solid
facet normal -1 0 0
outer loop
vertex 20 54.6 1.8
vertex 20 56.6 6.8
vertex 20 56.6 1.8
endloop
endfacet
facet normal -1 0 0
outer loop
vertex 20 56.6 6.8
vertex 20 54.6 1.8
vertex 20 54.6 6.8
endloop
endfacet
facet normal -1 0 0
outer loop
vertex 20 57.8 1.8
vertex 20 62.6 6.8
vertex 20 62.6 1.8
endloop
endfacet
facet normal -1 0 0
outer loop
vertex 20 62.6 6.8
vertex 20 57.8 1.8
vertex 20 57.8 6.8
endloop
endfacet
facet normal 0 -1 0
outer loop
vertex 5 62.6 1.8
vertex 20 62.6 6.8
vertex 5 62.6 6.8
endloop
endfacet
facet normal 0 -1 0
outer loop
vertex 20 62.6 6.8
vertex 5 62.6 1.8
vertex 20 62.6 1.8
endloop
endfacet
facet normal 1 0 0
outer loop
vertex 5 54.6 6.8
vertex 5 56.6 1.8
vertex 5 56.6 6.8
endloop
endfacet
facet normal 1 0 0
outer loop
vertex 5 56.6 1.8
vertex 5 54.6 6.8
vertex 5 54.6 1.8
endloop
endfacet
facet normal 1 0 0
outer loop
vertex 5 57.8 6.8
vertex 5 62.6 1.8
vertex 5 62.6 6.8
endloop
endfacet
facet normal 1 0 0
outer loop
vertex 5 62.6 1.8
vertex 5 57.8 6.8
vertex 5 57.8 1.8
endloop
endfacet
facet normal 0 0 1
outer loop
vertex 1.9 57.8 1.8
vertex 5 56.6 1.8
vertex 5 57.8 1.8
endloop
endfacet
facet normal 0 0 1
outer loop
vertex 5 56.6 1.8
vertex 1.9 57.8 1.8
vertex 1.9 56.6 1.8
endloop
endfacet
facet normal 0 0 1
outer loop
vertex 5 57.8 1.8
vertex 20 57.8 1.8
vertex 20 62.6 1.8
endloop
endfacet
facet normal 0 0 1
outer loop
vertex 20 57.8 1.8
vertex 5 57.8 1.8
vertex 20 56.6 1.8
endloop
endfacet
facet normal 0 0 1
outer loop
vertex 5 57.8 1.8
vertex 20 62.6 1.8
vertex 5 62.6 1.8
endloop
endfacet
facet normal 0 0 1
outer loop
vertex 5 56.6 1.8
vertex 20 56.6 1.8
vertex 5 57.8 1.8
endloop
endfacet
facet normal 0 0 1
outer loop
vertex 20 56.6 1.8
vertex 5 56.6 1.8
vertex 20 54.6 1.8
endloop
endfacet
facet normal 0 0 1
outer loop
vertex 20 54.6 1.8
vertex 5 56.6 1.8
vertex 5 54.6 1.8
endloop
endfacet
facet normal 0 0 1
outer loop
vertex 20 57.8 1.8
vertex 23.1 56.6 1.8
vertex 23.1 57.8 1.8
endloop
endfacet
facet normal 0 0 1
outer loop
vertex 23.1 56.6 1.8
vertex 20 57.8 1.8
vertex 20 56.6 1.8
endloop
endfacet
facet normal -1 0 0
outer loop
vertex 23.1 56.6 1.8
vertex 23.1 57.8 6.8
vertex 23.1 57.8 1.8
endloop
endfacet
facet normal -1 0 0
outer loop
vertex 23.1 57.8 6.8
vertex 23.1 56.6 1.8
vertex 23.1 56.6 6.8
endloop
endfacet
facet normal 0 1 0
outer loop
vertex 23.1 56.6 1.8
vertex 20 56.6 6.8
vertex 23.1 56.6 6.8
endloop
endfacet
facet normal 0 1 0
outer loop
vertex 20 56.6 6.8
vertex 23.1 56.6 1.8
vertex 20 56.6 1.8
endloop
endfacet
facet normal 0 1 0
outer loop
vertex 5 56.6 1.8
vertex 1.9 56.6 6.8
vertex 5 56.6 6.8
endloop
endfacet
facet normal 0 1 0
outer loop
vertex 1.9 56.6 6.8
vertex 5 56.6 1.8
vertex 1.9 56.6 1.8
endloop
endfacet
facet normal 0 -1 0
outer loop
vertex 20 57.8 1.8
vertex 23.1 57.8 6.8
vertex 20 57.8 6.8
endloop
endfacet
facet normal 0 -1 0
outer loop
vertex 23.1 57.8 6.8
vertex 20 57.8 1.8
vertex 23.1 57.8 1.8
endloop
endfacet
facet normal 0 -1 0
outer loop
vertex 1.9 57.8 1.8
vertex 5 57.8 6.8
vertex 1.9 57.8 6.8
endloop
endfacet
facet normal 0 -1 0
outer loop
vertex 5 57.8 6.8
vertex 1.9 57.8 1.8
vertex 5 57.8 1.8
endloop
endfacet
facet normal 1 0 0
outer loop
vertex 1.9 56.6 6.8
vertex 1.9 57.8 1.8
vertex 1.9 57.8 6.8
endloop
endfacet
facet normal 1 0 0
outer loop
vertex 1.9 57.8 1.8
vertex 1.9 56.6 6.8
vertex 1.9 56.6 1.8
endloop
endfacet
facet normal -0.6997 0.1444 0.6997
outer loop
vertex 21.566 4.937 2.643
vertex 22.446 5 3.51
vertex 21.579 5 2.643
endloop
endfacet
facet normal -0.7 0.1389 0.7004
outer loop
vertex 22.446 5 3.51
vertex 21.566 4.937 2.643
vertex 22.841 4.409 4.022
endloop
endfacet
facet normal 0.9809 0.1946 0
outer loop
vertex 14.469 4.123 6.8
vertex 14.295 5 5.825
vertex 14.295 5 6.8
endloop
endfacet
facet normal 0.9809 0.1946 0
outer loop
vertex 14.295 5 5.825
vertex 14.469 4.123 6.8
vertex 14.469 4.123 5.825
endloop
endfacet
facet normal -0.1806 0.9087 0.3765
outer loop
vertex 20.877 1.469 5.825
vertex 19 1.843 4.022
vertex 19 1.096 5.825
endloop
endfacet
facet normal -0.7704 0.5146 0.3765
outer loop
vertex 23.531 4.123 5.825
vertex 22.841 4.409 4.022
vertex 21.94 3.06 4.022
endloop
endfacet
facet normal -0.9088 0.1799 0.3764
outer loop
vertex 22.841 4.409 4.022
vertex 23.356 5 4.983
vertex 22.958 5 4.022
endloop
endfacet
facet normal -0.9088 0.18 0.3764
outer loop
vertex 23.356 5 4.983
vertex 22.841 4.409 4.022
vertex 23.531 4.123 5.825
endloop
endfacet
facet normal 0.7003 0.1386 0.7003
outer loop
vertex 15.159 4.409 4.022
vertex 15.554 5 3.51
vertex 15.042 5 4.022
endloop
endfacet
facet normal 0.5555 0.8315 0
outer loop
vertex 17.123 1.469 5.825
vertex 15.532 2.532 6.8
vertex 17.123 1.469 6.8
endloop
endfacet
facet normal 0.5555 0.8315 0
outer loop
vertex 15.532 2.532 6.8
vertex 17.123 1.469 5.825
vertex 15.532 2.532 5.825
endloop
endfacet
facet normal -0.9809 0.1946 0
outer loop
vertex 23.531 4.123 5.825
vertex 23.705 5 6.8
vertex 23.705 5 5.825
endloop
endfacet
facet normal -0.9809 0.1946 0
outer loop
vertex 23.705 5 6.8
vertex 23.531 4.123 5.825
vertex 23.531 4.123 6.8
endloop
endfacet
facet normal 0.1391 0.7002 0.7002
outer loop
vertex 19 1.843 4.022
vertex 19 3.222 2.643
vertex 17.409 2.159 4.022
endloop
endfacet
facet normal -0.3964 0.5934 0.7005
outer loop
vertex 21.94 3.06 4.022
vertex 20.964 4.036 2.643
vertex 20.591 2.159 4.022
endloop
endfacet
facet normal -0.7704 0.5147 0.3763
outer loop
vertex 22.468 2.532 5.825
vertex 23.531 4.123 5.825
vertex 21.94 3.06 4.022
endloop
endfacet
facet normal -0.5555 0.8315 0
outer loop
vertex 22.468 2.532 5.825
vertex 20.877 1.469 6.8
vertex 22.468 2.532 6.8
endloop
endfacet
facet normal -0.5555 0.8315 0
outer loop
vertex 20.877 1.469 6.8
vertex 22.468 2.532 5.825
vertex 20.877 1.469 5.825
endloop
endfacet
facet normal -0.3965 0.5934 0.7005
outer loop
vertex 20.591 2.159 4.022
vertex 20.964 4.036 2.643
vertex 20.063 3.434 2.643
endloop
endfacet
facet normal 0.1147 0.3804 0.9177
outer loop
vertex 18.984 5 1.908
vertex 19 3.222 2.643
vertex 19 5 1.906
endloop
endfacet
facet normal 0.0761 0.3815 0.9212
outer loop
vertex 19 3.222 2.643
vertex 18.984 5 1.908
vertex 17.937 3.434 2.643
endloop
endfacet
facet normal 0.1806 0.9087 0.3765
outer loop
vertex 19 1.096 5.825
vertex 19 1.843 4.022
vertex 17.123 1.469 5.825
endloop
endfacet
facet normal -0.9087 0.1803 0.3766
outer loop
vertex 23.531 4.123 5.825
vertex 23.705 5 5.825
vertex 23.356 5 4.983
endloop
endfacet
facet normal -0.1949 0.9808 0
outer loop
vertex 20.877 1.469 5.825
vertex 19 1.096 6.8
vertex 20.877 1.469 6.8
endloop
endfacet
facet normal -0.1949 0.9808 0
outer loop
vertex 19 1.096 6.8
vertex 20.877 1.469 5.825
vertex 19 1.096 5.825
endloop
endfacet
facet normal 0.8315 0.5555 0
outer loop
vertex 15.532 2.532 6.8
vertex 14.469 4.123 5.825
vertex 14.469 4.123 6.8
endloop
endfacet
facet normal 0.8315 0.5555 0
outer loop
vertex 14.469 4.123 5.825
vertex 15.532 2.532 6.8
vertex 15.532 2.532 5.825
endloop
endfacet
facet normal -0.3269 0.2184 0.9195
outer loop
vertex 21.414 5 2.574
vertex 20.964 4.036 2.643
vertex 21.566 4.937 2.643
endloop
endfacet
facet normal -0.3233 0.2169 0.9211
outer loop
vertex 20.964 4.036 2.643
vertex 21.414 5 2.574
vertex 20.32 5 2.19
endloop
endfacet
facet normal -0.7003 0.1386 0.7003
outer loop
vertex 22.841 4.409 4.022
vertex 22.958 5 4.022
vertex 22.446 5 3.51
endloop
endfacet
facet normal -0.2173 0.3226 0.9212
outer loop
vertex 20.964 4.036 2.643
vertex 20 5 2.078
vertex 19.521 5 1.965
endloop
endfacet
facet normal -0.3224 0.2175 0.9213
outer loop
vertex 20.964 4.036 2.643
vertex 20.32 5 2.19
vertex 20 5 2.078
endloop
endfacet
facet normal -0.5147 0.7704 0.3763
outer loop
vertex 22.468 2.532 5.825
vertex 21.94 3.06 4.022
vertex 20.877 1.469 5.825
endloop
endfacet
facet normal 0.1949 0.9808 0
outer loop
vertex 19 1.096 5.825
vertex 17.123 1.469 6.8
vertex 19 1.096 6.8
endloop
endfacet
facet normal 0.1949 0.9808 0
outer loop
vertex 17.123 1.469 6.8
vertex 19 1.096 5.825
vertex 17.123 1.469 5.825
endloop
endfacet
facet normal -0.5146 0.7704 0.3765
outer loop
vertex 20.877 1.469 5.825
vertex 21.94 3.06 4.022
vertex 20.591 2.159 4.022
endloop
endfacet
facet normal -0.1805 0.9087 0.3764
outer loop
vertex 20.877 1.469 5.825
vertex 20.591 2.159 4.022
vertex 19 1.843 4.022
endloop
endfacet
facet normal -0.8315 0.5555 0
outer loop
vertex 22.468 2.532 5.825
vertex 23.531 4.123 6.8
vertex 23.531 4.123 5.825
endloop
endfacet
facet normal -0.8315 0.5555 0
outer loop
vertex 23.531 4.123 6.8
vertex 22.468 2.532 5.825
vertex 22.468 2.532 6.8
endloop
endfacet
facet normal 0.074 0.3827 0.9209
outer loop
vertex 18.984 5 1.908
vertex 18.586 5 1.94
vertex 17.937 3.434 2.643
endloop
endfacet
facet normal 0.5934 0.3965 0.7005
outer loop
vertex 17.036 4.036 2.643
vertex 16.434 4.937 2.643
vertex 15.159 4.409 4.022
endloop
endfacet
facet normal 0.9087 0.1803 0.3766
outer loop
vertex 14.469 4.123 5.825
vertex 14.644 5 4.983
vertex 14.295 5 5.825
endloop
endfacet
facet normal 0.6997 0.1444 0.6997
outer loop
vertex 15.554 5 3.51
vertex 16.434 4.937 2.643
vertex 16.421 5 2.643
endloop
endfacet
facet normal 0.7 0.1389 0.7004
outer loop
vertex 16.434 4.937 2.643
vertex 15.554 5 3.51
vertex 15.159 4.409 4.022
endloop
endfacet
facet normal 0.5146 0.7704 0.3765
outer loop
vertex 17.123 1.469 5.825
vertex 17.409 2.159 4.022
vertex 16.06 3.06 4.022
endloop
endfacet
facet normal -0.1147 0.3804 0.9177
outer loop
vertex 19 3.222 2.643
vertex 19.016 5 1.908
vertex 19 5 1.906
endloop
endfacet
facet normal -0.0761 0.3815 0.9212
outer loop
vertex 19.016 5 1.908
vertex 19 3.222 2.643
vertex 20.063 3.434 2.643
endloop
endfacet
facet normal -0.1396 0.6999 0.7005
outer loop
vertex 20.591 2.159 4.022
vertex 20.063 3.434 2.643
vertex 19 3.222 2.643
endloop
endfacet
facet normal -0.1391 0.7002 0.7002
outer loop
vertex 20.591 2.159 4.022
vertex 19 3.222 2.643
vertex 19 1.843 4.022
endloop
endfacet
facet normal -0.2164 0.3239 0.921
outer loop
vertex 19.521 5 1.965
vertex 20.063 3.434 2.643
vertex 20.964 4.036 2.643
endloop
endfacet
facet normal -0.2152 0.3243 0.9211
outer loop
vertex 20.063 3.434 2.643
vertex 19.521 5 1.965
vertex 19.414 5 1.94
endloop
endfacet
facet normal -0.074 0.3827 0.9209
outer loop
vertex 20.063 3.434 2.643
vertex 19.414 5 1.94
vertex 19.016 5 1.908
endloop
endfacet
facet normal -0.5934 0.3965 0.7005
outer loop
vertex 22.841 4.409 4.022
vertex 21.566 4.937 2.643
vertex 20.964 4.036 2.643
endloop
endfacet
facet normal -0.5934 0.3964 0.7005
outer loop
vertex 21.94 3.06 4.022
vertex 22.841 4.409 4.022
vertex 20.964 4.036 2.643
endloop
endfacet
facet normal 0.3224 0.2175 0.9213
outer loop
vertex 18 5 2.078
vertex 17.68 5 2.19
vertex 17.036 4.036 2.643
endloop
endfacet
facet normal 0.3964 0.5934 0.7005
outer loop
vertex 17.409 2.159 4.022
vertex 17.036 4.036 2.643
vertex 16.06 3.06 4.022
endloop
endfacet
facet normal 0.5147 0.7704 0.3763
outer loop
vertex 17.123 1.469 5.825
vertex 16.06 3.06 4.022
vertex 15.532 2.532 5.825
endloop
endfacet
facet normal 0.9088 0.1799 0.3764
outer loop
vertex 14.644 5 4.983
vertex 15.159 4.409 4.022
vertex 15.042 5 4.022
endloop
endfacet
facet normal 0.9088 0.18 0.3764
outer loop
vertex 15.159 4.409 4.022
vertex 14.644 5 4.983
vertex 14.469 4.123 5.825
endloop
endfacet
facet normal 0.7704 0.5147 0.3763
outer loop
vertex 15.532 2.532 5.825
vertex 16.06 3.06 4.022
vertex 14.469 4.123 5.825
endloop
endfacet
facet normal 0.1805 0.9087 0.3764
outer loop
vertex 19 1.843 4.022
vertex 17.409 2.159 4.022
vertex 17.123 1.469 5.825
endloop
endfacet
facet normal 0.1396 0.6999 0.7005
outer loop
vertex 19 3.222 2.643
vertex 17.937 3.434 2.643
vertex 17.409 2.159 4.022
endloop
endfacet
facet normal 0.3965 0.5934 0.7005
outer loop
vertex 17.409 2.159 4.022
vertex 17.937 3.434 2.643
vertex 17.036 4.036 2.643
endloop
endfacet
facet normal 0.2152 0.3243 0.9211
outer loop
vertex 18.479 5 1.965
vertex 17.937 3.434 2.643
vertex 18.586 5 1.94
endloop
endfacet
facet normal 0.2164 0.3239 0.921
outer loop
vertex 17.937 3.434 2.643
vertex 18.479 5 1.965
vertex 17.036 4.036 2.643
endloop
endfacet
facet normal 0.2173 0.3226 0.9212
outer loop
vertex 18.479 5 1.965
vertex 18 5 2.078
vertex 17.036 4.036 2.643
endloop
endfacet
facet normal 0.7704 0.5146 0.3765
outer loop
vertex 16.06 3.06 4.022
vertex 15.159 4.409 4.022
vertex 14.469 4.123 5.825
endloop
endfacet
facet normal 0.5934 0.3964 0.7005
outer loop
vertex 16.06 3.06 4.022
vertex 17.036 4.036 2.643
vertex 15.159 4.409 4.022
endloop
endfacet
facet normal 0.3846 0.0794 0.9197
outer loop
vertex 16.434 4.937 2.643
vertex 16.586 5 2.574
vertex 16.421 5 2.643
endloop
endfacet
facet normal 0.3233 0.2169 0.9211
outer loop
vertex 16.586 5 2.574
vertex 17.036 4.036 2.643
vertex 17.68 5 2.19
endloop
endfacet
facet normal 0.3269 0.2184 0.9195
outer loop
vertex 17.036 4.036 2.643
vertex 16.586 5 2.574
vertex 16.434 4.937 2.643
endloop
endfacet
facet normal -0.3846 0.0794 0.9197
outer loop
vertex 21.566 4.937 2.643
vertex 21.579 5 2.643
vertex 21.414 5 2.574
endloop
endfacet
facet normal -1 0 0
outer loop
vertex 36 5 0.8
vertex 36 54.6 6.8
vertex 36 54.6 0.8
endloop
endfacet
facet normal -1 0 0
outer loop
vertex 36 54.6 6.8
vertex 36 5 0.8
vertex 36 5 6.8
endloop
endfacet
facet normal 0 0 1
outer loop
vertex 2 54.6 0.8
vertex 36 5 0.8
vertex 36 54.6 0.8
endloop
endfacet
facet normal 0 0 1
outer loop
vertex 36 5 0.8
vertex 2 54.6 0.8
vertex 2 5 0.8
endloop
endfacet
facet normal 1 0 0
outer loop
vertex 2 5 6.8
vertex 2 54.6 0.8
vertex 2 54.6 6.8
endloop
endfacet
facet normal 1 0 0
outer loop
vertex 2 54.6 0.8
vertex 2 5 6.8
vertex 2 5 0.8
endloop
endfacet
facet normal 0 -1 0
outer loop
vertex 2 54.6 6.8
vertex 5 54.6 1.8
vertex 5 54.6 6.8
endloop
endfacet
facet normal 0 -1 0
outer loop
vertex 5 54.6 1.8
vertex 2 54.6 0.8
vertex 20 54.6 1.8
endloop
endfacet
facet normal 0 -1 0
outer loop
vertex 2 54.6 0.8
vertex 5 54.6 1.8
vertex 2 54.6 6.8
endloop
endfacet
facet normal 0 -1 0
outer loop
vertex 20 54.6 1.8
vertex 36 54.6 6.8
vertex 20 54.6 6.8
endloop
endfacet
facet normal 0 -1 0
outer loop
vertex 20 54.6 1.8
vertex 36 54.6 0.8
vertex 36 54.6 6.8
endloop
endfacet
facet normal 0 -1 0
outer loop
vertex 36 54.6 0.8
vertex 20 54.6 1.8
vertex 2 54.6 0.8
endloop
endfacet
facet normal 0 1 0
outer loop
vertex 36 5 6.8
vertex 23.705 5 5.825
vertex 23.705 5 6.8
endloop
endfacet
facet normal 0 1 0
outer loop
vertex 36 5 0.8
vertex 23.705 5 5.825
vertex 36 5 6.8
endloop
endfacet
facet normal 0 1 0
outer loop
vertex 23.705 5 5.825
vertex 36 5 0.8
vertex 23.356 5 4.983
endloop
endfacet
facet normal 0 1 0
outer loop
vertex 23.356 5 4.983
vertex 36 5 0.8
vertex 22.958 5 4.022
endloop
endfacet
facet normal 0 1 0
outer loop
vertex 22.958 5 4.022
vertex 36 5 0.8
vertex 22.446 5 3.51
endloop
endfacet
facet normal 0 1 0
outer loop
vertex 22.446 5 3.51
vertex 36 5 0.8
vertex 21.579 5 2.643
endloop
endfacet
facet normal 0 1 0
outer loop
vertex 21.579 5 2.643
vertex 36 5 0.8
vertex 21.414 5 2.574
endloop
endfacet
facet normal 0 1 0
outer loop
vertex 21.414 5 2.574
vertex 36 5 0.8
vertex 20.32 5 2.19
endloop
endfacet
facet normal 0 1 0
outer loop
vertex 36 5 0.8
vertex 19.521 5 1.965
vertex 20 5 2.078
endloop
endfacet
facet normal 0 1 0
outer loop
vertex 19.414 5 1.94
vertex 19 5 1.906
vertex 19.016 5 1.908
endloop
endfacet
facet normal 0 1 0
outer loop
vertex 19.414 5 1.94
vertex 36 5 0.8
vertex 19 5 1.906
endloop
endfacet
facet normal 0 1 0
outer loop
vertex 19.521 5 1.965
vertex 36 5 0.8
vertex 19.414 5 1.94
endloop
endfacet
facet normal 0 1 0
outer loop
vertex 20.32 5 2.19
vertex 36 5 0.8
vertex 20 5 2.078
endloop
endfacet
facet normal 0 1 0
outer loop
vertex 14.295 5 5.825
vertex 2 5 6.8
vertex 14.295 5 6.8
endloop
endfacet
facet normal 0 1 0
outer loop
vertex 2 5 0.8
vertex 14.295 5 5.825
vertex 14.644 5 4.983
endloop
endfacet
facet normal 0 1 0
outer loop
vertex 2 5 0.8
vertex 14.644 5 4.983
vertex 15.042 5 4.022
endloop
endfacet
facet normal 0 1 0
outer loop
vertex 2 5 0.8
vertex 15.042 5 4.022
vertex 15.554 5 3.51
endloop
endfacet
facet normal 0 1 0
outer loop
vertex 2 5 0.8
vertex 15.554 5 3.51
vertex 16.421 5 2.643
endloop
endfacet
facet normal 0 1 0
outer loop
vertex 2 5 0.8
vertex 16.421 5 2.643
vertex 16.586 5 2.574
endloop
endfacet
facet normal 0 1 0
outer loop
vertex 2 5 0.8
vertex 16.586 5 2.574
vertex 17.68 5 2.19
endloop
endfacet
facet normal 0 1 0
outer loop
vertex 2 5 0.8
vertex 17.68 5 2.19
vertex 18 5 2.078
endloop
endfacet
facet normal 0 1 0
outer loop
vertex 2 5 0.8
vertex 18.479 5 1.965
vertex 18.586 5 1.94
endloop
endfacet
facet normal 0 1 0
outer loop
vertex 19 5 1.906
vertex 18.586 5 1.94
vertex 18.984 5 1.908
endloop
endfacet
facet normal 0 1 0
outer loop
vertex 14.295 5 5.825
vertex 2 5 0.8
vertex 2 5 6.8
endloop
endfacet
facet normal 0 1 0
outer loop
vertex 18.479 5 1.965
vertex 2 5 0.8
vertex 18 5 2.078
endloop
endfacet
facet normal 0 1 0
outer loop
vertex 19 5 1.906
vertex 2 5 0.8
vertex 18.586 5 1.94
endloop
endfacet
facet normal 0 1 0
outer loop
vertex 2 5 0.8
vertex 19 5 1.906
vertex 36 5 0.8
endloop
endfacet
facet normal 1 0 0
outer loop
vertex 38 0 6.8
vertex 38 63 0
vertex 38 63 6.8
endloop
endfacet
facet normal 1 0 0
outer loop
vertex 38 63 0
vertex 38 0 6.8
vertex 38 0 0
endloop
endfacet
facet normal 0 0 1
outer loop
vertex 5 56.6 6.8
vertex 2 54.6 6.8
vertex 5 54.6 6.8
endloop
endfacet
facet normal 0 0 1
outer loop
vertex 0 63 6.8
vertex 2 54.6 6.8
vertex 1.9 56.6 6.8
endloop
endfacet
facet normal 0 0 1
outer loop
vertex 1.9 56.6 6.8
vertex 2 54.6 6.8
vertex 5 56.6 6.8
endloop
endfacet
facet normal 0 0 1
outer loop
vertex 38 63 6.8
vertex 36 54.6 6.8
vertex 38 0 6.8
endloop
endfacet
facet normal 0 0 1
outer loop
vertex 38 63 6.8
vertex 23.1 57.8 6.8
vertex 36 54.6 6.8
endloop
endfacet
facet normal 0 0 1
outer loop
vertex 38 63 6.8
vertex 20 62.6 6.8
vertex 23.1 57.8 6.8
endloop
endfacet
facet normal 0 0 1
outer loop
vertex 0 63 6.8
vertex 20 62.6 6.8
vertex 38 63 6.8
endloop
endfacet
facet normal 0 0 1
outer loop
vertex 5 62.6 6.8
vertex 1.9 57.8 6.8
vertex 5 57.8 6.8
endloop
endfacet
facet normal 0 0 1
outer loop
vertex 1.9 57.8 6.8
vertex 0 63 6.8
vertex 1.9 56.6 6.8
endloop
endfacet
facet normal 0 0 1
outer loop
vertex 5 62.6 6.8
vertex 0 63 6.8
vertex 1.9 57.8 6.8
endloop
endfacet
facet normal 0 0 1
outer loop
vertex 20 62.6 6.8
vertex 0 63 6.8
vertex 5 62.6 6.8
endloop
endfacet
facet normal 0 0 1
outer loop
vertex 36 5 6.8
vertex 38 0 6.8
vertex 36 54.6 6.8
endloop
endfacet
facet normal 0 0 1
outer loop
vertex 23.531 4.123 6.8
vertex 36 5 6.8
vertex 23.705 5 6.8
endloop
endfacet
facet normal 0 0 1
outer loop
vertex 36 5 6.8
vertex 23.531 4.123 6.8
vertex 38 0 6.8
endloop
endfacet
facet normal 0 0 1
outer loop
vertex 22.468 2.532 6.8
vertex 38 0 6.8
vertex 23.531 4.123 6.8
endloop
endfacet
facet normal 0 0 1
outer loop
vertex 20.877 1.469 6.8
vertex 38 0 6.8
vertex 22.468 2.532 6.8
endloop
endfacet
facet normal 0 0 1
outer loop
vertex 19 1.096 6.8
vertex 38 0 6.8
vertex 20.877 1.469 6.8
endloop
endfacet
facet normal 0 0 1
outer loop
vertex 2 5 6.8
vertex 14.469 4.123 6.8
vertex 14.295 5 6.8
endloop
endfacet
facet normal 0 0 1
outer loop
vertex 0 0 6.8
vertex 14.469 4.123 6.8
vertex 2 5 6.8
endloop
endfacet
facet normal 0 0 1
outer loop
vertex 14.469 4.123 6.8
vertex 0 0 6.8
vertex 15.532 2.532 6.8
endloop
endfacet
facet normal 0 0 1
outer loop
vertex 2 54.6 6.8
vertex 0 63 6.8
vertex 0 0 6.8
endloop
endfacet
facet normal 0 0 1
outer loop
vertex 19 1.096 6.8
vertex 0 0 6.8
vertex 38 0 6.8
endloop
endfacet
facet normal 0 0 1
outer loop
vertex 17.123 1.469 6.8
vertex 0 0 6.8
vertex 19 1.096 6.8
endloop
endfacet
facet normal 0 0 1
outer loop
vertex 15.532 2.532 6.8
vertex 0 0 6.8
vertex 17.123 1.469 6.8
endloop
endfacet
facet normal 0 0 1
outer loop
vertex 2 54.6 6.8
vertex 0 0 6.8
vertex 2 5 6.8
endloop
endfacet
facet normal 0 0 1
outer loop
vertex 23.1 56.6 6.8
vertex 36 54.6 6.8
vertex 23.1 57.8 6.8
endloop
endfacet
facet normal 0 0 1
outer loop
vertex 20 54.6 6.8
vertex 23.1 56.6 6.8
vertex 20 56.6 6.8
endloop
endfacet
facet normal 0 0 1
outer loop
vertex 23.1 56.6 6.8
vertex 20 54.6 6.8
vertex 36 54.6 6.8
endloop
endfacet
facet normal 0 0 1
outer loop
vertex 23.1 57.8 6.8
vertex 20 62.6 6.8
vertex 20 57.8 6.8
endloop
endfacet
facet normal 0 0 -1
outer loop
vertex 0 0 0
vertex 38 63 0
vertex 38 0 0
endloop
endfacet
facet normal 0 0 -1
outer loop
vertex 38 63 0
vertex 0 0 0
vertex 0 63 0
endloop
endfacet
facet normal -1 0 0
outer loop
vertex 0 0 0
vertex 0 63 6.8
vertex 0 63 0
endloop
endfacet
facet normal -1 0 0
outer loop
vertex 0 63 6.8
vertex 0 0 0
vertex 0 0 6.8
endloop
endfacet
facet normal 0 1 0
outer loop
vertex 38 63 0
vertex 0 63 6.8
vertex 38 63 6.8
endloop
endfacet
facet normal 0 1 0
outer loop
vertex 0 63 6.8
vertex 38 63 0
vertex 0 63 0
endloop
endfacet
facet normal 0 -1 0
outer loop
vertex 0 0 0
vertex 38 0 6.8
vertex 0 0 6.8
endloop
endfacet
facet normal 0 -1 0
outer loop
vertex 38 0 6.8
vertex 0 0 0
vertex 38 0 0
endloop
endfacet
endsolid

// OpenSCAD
in_width = 34;
in_height = 49.6;
in_depth = 6;

bat_con_depth_with_cables = 10;
bat_con_h = 4;
bat_con_with_ears_w = 21;
bat_con_no_ears_w = 15;
bat_con_to_ears_depth = 2;
bat_con_ear_thickness = 1;

steps = [8.5, 11, 13.5];
touch_block_w = 20;
touch_block_h = 6;

touch_w = 1.4;

module cylinder_or_cube(h, r, is_cube = false) {
  if (is_cube) {
    translate([-r, -r, 0]) {
      cube([r * 2, r * 2, h]);
    }
  } else {
    cylinder(h = h, r = r, center = false);
  }
}

module bat_con(cutoff = false) {
  $fn = 32;
  additional_depth = cutoff ? bat_con_h : 0;
  additional_ear_w = cutoff ? 0.2 : 0;
  additional_ear_t = cutoff ? 0.2 : 0;
  echo(additional_depth);
  module bat_con_base() {
    hull() {
      rotate(90, [0, 1, 0]) {
        cylinder_or_cube(h = bat_con_h + additional_depth, r = bat_con_h / 2, is_cube = cutoff);
      }
      translate([0, bat_con_no_ears_w - bat_con_h, 0]) {
        rotate(90, [0, 1, 0]) {
          cylinder_or_cube(h = bat_con_h + additional_depth, r = bat_con_h / 2, is_cube = cutoff);
        }
      }
    }
  }
  module bat_con_ears() {
    hull() {
      translate([0, -(additional_ear_w / 2), 0]) {
        rotate(90, [0, 1, 0]) {
          cylinder_or_cube(
              h = bat_con_ear_thickness + additional_ear_t, r = bat_con_h / 2, is_cube = cutoff
          );
        }
      }
      translate([0, (bat_con_with_ears_w - bat_con_h) + (additional_ear_w / 2), 0]) {
        rotate(90, [0, 1, 0]) {
          cylinder_or_cube(
              h = bat_con_ear_thickness + additional_ear_t, r = bat_con_h / 2, is_cube = cutoff
          );
        }
      }
    }
  }
  bat_con_base();
  shift = (bat_con_with_ears_w - bat_con_no_ears_w) / -2;
  translate([bat_con_to_ears_depth, shift, 0]) {
    bat_con_ears();
  }
}

module battery_box() {
  difference() {
    cube([38, 63, 6.8]);
    translate([2, 5, 0.8]) {
      translate([in_width / 2, 1, 6]) {
        sphere(5);
      }
      cube([in_width, in_height, in_depth + 1]);
      for (i = [0, bat_con_h]) {
        translate([16, in_height - 0.0001, 3 + i]) {
          rotate(90, [0, 0, 1]) {
            bat_con(true);
          }
        }
      }
    }
  }
}

render() {
  battery_box();
}
